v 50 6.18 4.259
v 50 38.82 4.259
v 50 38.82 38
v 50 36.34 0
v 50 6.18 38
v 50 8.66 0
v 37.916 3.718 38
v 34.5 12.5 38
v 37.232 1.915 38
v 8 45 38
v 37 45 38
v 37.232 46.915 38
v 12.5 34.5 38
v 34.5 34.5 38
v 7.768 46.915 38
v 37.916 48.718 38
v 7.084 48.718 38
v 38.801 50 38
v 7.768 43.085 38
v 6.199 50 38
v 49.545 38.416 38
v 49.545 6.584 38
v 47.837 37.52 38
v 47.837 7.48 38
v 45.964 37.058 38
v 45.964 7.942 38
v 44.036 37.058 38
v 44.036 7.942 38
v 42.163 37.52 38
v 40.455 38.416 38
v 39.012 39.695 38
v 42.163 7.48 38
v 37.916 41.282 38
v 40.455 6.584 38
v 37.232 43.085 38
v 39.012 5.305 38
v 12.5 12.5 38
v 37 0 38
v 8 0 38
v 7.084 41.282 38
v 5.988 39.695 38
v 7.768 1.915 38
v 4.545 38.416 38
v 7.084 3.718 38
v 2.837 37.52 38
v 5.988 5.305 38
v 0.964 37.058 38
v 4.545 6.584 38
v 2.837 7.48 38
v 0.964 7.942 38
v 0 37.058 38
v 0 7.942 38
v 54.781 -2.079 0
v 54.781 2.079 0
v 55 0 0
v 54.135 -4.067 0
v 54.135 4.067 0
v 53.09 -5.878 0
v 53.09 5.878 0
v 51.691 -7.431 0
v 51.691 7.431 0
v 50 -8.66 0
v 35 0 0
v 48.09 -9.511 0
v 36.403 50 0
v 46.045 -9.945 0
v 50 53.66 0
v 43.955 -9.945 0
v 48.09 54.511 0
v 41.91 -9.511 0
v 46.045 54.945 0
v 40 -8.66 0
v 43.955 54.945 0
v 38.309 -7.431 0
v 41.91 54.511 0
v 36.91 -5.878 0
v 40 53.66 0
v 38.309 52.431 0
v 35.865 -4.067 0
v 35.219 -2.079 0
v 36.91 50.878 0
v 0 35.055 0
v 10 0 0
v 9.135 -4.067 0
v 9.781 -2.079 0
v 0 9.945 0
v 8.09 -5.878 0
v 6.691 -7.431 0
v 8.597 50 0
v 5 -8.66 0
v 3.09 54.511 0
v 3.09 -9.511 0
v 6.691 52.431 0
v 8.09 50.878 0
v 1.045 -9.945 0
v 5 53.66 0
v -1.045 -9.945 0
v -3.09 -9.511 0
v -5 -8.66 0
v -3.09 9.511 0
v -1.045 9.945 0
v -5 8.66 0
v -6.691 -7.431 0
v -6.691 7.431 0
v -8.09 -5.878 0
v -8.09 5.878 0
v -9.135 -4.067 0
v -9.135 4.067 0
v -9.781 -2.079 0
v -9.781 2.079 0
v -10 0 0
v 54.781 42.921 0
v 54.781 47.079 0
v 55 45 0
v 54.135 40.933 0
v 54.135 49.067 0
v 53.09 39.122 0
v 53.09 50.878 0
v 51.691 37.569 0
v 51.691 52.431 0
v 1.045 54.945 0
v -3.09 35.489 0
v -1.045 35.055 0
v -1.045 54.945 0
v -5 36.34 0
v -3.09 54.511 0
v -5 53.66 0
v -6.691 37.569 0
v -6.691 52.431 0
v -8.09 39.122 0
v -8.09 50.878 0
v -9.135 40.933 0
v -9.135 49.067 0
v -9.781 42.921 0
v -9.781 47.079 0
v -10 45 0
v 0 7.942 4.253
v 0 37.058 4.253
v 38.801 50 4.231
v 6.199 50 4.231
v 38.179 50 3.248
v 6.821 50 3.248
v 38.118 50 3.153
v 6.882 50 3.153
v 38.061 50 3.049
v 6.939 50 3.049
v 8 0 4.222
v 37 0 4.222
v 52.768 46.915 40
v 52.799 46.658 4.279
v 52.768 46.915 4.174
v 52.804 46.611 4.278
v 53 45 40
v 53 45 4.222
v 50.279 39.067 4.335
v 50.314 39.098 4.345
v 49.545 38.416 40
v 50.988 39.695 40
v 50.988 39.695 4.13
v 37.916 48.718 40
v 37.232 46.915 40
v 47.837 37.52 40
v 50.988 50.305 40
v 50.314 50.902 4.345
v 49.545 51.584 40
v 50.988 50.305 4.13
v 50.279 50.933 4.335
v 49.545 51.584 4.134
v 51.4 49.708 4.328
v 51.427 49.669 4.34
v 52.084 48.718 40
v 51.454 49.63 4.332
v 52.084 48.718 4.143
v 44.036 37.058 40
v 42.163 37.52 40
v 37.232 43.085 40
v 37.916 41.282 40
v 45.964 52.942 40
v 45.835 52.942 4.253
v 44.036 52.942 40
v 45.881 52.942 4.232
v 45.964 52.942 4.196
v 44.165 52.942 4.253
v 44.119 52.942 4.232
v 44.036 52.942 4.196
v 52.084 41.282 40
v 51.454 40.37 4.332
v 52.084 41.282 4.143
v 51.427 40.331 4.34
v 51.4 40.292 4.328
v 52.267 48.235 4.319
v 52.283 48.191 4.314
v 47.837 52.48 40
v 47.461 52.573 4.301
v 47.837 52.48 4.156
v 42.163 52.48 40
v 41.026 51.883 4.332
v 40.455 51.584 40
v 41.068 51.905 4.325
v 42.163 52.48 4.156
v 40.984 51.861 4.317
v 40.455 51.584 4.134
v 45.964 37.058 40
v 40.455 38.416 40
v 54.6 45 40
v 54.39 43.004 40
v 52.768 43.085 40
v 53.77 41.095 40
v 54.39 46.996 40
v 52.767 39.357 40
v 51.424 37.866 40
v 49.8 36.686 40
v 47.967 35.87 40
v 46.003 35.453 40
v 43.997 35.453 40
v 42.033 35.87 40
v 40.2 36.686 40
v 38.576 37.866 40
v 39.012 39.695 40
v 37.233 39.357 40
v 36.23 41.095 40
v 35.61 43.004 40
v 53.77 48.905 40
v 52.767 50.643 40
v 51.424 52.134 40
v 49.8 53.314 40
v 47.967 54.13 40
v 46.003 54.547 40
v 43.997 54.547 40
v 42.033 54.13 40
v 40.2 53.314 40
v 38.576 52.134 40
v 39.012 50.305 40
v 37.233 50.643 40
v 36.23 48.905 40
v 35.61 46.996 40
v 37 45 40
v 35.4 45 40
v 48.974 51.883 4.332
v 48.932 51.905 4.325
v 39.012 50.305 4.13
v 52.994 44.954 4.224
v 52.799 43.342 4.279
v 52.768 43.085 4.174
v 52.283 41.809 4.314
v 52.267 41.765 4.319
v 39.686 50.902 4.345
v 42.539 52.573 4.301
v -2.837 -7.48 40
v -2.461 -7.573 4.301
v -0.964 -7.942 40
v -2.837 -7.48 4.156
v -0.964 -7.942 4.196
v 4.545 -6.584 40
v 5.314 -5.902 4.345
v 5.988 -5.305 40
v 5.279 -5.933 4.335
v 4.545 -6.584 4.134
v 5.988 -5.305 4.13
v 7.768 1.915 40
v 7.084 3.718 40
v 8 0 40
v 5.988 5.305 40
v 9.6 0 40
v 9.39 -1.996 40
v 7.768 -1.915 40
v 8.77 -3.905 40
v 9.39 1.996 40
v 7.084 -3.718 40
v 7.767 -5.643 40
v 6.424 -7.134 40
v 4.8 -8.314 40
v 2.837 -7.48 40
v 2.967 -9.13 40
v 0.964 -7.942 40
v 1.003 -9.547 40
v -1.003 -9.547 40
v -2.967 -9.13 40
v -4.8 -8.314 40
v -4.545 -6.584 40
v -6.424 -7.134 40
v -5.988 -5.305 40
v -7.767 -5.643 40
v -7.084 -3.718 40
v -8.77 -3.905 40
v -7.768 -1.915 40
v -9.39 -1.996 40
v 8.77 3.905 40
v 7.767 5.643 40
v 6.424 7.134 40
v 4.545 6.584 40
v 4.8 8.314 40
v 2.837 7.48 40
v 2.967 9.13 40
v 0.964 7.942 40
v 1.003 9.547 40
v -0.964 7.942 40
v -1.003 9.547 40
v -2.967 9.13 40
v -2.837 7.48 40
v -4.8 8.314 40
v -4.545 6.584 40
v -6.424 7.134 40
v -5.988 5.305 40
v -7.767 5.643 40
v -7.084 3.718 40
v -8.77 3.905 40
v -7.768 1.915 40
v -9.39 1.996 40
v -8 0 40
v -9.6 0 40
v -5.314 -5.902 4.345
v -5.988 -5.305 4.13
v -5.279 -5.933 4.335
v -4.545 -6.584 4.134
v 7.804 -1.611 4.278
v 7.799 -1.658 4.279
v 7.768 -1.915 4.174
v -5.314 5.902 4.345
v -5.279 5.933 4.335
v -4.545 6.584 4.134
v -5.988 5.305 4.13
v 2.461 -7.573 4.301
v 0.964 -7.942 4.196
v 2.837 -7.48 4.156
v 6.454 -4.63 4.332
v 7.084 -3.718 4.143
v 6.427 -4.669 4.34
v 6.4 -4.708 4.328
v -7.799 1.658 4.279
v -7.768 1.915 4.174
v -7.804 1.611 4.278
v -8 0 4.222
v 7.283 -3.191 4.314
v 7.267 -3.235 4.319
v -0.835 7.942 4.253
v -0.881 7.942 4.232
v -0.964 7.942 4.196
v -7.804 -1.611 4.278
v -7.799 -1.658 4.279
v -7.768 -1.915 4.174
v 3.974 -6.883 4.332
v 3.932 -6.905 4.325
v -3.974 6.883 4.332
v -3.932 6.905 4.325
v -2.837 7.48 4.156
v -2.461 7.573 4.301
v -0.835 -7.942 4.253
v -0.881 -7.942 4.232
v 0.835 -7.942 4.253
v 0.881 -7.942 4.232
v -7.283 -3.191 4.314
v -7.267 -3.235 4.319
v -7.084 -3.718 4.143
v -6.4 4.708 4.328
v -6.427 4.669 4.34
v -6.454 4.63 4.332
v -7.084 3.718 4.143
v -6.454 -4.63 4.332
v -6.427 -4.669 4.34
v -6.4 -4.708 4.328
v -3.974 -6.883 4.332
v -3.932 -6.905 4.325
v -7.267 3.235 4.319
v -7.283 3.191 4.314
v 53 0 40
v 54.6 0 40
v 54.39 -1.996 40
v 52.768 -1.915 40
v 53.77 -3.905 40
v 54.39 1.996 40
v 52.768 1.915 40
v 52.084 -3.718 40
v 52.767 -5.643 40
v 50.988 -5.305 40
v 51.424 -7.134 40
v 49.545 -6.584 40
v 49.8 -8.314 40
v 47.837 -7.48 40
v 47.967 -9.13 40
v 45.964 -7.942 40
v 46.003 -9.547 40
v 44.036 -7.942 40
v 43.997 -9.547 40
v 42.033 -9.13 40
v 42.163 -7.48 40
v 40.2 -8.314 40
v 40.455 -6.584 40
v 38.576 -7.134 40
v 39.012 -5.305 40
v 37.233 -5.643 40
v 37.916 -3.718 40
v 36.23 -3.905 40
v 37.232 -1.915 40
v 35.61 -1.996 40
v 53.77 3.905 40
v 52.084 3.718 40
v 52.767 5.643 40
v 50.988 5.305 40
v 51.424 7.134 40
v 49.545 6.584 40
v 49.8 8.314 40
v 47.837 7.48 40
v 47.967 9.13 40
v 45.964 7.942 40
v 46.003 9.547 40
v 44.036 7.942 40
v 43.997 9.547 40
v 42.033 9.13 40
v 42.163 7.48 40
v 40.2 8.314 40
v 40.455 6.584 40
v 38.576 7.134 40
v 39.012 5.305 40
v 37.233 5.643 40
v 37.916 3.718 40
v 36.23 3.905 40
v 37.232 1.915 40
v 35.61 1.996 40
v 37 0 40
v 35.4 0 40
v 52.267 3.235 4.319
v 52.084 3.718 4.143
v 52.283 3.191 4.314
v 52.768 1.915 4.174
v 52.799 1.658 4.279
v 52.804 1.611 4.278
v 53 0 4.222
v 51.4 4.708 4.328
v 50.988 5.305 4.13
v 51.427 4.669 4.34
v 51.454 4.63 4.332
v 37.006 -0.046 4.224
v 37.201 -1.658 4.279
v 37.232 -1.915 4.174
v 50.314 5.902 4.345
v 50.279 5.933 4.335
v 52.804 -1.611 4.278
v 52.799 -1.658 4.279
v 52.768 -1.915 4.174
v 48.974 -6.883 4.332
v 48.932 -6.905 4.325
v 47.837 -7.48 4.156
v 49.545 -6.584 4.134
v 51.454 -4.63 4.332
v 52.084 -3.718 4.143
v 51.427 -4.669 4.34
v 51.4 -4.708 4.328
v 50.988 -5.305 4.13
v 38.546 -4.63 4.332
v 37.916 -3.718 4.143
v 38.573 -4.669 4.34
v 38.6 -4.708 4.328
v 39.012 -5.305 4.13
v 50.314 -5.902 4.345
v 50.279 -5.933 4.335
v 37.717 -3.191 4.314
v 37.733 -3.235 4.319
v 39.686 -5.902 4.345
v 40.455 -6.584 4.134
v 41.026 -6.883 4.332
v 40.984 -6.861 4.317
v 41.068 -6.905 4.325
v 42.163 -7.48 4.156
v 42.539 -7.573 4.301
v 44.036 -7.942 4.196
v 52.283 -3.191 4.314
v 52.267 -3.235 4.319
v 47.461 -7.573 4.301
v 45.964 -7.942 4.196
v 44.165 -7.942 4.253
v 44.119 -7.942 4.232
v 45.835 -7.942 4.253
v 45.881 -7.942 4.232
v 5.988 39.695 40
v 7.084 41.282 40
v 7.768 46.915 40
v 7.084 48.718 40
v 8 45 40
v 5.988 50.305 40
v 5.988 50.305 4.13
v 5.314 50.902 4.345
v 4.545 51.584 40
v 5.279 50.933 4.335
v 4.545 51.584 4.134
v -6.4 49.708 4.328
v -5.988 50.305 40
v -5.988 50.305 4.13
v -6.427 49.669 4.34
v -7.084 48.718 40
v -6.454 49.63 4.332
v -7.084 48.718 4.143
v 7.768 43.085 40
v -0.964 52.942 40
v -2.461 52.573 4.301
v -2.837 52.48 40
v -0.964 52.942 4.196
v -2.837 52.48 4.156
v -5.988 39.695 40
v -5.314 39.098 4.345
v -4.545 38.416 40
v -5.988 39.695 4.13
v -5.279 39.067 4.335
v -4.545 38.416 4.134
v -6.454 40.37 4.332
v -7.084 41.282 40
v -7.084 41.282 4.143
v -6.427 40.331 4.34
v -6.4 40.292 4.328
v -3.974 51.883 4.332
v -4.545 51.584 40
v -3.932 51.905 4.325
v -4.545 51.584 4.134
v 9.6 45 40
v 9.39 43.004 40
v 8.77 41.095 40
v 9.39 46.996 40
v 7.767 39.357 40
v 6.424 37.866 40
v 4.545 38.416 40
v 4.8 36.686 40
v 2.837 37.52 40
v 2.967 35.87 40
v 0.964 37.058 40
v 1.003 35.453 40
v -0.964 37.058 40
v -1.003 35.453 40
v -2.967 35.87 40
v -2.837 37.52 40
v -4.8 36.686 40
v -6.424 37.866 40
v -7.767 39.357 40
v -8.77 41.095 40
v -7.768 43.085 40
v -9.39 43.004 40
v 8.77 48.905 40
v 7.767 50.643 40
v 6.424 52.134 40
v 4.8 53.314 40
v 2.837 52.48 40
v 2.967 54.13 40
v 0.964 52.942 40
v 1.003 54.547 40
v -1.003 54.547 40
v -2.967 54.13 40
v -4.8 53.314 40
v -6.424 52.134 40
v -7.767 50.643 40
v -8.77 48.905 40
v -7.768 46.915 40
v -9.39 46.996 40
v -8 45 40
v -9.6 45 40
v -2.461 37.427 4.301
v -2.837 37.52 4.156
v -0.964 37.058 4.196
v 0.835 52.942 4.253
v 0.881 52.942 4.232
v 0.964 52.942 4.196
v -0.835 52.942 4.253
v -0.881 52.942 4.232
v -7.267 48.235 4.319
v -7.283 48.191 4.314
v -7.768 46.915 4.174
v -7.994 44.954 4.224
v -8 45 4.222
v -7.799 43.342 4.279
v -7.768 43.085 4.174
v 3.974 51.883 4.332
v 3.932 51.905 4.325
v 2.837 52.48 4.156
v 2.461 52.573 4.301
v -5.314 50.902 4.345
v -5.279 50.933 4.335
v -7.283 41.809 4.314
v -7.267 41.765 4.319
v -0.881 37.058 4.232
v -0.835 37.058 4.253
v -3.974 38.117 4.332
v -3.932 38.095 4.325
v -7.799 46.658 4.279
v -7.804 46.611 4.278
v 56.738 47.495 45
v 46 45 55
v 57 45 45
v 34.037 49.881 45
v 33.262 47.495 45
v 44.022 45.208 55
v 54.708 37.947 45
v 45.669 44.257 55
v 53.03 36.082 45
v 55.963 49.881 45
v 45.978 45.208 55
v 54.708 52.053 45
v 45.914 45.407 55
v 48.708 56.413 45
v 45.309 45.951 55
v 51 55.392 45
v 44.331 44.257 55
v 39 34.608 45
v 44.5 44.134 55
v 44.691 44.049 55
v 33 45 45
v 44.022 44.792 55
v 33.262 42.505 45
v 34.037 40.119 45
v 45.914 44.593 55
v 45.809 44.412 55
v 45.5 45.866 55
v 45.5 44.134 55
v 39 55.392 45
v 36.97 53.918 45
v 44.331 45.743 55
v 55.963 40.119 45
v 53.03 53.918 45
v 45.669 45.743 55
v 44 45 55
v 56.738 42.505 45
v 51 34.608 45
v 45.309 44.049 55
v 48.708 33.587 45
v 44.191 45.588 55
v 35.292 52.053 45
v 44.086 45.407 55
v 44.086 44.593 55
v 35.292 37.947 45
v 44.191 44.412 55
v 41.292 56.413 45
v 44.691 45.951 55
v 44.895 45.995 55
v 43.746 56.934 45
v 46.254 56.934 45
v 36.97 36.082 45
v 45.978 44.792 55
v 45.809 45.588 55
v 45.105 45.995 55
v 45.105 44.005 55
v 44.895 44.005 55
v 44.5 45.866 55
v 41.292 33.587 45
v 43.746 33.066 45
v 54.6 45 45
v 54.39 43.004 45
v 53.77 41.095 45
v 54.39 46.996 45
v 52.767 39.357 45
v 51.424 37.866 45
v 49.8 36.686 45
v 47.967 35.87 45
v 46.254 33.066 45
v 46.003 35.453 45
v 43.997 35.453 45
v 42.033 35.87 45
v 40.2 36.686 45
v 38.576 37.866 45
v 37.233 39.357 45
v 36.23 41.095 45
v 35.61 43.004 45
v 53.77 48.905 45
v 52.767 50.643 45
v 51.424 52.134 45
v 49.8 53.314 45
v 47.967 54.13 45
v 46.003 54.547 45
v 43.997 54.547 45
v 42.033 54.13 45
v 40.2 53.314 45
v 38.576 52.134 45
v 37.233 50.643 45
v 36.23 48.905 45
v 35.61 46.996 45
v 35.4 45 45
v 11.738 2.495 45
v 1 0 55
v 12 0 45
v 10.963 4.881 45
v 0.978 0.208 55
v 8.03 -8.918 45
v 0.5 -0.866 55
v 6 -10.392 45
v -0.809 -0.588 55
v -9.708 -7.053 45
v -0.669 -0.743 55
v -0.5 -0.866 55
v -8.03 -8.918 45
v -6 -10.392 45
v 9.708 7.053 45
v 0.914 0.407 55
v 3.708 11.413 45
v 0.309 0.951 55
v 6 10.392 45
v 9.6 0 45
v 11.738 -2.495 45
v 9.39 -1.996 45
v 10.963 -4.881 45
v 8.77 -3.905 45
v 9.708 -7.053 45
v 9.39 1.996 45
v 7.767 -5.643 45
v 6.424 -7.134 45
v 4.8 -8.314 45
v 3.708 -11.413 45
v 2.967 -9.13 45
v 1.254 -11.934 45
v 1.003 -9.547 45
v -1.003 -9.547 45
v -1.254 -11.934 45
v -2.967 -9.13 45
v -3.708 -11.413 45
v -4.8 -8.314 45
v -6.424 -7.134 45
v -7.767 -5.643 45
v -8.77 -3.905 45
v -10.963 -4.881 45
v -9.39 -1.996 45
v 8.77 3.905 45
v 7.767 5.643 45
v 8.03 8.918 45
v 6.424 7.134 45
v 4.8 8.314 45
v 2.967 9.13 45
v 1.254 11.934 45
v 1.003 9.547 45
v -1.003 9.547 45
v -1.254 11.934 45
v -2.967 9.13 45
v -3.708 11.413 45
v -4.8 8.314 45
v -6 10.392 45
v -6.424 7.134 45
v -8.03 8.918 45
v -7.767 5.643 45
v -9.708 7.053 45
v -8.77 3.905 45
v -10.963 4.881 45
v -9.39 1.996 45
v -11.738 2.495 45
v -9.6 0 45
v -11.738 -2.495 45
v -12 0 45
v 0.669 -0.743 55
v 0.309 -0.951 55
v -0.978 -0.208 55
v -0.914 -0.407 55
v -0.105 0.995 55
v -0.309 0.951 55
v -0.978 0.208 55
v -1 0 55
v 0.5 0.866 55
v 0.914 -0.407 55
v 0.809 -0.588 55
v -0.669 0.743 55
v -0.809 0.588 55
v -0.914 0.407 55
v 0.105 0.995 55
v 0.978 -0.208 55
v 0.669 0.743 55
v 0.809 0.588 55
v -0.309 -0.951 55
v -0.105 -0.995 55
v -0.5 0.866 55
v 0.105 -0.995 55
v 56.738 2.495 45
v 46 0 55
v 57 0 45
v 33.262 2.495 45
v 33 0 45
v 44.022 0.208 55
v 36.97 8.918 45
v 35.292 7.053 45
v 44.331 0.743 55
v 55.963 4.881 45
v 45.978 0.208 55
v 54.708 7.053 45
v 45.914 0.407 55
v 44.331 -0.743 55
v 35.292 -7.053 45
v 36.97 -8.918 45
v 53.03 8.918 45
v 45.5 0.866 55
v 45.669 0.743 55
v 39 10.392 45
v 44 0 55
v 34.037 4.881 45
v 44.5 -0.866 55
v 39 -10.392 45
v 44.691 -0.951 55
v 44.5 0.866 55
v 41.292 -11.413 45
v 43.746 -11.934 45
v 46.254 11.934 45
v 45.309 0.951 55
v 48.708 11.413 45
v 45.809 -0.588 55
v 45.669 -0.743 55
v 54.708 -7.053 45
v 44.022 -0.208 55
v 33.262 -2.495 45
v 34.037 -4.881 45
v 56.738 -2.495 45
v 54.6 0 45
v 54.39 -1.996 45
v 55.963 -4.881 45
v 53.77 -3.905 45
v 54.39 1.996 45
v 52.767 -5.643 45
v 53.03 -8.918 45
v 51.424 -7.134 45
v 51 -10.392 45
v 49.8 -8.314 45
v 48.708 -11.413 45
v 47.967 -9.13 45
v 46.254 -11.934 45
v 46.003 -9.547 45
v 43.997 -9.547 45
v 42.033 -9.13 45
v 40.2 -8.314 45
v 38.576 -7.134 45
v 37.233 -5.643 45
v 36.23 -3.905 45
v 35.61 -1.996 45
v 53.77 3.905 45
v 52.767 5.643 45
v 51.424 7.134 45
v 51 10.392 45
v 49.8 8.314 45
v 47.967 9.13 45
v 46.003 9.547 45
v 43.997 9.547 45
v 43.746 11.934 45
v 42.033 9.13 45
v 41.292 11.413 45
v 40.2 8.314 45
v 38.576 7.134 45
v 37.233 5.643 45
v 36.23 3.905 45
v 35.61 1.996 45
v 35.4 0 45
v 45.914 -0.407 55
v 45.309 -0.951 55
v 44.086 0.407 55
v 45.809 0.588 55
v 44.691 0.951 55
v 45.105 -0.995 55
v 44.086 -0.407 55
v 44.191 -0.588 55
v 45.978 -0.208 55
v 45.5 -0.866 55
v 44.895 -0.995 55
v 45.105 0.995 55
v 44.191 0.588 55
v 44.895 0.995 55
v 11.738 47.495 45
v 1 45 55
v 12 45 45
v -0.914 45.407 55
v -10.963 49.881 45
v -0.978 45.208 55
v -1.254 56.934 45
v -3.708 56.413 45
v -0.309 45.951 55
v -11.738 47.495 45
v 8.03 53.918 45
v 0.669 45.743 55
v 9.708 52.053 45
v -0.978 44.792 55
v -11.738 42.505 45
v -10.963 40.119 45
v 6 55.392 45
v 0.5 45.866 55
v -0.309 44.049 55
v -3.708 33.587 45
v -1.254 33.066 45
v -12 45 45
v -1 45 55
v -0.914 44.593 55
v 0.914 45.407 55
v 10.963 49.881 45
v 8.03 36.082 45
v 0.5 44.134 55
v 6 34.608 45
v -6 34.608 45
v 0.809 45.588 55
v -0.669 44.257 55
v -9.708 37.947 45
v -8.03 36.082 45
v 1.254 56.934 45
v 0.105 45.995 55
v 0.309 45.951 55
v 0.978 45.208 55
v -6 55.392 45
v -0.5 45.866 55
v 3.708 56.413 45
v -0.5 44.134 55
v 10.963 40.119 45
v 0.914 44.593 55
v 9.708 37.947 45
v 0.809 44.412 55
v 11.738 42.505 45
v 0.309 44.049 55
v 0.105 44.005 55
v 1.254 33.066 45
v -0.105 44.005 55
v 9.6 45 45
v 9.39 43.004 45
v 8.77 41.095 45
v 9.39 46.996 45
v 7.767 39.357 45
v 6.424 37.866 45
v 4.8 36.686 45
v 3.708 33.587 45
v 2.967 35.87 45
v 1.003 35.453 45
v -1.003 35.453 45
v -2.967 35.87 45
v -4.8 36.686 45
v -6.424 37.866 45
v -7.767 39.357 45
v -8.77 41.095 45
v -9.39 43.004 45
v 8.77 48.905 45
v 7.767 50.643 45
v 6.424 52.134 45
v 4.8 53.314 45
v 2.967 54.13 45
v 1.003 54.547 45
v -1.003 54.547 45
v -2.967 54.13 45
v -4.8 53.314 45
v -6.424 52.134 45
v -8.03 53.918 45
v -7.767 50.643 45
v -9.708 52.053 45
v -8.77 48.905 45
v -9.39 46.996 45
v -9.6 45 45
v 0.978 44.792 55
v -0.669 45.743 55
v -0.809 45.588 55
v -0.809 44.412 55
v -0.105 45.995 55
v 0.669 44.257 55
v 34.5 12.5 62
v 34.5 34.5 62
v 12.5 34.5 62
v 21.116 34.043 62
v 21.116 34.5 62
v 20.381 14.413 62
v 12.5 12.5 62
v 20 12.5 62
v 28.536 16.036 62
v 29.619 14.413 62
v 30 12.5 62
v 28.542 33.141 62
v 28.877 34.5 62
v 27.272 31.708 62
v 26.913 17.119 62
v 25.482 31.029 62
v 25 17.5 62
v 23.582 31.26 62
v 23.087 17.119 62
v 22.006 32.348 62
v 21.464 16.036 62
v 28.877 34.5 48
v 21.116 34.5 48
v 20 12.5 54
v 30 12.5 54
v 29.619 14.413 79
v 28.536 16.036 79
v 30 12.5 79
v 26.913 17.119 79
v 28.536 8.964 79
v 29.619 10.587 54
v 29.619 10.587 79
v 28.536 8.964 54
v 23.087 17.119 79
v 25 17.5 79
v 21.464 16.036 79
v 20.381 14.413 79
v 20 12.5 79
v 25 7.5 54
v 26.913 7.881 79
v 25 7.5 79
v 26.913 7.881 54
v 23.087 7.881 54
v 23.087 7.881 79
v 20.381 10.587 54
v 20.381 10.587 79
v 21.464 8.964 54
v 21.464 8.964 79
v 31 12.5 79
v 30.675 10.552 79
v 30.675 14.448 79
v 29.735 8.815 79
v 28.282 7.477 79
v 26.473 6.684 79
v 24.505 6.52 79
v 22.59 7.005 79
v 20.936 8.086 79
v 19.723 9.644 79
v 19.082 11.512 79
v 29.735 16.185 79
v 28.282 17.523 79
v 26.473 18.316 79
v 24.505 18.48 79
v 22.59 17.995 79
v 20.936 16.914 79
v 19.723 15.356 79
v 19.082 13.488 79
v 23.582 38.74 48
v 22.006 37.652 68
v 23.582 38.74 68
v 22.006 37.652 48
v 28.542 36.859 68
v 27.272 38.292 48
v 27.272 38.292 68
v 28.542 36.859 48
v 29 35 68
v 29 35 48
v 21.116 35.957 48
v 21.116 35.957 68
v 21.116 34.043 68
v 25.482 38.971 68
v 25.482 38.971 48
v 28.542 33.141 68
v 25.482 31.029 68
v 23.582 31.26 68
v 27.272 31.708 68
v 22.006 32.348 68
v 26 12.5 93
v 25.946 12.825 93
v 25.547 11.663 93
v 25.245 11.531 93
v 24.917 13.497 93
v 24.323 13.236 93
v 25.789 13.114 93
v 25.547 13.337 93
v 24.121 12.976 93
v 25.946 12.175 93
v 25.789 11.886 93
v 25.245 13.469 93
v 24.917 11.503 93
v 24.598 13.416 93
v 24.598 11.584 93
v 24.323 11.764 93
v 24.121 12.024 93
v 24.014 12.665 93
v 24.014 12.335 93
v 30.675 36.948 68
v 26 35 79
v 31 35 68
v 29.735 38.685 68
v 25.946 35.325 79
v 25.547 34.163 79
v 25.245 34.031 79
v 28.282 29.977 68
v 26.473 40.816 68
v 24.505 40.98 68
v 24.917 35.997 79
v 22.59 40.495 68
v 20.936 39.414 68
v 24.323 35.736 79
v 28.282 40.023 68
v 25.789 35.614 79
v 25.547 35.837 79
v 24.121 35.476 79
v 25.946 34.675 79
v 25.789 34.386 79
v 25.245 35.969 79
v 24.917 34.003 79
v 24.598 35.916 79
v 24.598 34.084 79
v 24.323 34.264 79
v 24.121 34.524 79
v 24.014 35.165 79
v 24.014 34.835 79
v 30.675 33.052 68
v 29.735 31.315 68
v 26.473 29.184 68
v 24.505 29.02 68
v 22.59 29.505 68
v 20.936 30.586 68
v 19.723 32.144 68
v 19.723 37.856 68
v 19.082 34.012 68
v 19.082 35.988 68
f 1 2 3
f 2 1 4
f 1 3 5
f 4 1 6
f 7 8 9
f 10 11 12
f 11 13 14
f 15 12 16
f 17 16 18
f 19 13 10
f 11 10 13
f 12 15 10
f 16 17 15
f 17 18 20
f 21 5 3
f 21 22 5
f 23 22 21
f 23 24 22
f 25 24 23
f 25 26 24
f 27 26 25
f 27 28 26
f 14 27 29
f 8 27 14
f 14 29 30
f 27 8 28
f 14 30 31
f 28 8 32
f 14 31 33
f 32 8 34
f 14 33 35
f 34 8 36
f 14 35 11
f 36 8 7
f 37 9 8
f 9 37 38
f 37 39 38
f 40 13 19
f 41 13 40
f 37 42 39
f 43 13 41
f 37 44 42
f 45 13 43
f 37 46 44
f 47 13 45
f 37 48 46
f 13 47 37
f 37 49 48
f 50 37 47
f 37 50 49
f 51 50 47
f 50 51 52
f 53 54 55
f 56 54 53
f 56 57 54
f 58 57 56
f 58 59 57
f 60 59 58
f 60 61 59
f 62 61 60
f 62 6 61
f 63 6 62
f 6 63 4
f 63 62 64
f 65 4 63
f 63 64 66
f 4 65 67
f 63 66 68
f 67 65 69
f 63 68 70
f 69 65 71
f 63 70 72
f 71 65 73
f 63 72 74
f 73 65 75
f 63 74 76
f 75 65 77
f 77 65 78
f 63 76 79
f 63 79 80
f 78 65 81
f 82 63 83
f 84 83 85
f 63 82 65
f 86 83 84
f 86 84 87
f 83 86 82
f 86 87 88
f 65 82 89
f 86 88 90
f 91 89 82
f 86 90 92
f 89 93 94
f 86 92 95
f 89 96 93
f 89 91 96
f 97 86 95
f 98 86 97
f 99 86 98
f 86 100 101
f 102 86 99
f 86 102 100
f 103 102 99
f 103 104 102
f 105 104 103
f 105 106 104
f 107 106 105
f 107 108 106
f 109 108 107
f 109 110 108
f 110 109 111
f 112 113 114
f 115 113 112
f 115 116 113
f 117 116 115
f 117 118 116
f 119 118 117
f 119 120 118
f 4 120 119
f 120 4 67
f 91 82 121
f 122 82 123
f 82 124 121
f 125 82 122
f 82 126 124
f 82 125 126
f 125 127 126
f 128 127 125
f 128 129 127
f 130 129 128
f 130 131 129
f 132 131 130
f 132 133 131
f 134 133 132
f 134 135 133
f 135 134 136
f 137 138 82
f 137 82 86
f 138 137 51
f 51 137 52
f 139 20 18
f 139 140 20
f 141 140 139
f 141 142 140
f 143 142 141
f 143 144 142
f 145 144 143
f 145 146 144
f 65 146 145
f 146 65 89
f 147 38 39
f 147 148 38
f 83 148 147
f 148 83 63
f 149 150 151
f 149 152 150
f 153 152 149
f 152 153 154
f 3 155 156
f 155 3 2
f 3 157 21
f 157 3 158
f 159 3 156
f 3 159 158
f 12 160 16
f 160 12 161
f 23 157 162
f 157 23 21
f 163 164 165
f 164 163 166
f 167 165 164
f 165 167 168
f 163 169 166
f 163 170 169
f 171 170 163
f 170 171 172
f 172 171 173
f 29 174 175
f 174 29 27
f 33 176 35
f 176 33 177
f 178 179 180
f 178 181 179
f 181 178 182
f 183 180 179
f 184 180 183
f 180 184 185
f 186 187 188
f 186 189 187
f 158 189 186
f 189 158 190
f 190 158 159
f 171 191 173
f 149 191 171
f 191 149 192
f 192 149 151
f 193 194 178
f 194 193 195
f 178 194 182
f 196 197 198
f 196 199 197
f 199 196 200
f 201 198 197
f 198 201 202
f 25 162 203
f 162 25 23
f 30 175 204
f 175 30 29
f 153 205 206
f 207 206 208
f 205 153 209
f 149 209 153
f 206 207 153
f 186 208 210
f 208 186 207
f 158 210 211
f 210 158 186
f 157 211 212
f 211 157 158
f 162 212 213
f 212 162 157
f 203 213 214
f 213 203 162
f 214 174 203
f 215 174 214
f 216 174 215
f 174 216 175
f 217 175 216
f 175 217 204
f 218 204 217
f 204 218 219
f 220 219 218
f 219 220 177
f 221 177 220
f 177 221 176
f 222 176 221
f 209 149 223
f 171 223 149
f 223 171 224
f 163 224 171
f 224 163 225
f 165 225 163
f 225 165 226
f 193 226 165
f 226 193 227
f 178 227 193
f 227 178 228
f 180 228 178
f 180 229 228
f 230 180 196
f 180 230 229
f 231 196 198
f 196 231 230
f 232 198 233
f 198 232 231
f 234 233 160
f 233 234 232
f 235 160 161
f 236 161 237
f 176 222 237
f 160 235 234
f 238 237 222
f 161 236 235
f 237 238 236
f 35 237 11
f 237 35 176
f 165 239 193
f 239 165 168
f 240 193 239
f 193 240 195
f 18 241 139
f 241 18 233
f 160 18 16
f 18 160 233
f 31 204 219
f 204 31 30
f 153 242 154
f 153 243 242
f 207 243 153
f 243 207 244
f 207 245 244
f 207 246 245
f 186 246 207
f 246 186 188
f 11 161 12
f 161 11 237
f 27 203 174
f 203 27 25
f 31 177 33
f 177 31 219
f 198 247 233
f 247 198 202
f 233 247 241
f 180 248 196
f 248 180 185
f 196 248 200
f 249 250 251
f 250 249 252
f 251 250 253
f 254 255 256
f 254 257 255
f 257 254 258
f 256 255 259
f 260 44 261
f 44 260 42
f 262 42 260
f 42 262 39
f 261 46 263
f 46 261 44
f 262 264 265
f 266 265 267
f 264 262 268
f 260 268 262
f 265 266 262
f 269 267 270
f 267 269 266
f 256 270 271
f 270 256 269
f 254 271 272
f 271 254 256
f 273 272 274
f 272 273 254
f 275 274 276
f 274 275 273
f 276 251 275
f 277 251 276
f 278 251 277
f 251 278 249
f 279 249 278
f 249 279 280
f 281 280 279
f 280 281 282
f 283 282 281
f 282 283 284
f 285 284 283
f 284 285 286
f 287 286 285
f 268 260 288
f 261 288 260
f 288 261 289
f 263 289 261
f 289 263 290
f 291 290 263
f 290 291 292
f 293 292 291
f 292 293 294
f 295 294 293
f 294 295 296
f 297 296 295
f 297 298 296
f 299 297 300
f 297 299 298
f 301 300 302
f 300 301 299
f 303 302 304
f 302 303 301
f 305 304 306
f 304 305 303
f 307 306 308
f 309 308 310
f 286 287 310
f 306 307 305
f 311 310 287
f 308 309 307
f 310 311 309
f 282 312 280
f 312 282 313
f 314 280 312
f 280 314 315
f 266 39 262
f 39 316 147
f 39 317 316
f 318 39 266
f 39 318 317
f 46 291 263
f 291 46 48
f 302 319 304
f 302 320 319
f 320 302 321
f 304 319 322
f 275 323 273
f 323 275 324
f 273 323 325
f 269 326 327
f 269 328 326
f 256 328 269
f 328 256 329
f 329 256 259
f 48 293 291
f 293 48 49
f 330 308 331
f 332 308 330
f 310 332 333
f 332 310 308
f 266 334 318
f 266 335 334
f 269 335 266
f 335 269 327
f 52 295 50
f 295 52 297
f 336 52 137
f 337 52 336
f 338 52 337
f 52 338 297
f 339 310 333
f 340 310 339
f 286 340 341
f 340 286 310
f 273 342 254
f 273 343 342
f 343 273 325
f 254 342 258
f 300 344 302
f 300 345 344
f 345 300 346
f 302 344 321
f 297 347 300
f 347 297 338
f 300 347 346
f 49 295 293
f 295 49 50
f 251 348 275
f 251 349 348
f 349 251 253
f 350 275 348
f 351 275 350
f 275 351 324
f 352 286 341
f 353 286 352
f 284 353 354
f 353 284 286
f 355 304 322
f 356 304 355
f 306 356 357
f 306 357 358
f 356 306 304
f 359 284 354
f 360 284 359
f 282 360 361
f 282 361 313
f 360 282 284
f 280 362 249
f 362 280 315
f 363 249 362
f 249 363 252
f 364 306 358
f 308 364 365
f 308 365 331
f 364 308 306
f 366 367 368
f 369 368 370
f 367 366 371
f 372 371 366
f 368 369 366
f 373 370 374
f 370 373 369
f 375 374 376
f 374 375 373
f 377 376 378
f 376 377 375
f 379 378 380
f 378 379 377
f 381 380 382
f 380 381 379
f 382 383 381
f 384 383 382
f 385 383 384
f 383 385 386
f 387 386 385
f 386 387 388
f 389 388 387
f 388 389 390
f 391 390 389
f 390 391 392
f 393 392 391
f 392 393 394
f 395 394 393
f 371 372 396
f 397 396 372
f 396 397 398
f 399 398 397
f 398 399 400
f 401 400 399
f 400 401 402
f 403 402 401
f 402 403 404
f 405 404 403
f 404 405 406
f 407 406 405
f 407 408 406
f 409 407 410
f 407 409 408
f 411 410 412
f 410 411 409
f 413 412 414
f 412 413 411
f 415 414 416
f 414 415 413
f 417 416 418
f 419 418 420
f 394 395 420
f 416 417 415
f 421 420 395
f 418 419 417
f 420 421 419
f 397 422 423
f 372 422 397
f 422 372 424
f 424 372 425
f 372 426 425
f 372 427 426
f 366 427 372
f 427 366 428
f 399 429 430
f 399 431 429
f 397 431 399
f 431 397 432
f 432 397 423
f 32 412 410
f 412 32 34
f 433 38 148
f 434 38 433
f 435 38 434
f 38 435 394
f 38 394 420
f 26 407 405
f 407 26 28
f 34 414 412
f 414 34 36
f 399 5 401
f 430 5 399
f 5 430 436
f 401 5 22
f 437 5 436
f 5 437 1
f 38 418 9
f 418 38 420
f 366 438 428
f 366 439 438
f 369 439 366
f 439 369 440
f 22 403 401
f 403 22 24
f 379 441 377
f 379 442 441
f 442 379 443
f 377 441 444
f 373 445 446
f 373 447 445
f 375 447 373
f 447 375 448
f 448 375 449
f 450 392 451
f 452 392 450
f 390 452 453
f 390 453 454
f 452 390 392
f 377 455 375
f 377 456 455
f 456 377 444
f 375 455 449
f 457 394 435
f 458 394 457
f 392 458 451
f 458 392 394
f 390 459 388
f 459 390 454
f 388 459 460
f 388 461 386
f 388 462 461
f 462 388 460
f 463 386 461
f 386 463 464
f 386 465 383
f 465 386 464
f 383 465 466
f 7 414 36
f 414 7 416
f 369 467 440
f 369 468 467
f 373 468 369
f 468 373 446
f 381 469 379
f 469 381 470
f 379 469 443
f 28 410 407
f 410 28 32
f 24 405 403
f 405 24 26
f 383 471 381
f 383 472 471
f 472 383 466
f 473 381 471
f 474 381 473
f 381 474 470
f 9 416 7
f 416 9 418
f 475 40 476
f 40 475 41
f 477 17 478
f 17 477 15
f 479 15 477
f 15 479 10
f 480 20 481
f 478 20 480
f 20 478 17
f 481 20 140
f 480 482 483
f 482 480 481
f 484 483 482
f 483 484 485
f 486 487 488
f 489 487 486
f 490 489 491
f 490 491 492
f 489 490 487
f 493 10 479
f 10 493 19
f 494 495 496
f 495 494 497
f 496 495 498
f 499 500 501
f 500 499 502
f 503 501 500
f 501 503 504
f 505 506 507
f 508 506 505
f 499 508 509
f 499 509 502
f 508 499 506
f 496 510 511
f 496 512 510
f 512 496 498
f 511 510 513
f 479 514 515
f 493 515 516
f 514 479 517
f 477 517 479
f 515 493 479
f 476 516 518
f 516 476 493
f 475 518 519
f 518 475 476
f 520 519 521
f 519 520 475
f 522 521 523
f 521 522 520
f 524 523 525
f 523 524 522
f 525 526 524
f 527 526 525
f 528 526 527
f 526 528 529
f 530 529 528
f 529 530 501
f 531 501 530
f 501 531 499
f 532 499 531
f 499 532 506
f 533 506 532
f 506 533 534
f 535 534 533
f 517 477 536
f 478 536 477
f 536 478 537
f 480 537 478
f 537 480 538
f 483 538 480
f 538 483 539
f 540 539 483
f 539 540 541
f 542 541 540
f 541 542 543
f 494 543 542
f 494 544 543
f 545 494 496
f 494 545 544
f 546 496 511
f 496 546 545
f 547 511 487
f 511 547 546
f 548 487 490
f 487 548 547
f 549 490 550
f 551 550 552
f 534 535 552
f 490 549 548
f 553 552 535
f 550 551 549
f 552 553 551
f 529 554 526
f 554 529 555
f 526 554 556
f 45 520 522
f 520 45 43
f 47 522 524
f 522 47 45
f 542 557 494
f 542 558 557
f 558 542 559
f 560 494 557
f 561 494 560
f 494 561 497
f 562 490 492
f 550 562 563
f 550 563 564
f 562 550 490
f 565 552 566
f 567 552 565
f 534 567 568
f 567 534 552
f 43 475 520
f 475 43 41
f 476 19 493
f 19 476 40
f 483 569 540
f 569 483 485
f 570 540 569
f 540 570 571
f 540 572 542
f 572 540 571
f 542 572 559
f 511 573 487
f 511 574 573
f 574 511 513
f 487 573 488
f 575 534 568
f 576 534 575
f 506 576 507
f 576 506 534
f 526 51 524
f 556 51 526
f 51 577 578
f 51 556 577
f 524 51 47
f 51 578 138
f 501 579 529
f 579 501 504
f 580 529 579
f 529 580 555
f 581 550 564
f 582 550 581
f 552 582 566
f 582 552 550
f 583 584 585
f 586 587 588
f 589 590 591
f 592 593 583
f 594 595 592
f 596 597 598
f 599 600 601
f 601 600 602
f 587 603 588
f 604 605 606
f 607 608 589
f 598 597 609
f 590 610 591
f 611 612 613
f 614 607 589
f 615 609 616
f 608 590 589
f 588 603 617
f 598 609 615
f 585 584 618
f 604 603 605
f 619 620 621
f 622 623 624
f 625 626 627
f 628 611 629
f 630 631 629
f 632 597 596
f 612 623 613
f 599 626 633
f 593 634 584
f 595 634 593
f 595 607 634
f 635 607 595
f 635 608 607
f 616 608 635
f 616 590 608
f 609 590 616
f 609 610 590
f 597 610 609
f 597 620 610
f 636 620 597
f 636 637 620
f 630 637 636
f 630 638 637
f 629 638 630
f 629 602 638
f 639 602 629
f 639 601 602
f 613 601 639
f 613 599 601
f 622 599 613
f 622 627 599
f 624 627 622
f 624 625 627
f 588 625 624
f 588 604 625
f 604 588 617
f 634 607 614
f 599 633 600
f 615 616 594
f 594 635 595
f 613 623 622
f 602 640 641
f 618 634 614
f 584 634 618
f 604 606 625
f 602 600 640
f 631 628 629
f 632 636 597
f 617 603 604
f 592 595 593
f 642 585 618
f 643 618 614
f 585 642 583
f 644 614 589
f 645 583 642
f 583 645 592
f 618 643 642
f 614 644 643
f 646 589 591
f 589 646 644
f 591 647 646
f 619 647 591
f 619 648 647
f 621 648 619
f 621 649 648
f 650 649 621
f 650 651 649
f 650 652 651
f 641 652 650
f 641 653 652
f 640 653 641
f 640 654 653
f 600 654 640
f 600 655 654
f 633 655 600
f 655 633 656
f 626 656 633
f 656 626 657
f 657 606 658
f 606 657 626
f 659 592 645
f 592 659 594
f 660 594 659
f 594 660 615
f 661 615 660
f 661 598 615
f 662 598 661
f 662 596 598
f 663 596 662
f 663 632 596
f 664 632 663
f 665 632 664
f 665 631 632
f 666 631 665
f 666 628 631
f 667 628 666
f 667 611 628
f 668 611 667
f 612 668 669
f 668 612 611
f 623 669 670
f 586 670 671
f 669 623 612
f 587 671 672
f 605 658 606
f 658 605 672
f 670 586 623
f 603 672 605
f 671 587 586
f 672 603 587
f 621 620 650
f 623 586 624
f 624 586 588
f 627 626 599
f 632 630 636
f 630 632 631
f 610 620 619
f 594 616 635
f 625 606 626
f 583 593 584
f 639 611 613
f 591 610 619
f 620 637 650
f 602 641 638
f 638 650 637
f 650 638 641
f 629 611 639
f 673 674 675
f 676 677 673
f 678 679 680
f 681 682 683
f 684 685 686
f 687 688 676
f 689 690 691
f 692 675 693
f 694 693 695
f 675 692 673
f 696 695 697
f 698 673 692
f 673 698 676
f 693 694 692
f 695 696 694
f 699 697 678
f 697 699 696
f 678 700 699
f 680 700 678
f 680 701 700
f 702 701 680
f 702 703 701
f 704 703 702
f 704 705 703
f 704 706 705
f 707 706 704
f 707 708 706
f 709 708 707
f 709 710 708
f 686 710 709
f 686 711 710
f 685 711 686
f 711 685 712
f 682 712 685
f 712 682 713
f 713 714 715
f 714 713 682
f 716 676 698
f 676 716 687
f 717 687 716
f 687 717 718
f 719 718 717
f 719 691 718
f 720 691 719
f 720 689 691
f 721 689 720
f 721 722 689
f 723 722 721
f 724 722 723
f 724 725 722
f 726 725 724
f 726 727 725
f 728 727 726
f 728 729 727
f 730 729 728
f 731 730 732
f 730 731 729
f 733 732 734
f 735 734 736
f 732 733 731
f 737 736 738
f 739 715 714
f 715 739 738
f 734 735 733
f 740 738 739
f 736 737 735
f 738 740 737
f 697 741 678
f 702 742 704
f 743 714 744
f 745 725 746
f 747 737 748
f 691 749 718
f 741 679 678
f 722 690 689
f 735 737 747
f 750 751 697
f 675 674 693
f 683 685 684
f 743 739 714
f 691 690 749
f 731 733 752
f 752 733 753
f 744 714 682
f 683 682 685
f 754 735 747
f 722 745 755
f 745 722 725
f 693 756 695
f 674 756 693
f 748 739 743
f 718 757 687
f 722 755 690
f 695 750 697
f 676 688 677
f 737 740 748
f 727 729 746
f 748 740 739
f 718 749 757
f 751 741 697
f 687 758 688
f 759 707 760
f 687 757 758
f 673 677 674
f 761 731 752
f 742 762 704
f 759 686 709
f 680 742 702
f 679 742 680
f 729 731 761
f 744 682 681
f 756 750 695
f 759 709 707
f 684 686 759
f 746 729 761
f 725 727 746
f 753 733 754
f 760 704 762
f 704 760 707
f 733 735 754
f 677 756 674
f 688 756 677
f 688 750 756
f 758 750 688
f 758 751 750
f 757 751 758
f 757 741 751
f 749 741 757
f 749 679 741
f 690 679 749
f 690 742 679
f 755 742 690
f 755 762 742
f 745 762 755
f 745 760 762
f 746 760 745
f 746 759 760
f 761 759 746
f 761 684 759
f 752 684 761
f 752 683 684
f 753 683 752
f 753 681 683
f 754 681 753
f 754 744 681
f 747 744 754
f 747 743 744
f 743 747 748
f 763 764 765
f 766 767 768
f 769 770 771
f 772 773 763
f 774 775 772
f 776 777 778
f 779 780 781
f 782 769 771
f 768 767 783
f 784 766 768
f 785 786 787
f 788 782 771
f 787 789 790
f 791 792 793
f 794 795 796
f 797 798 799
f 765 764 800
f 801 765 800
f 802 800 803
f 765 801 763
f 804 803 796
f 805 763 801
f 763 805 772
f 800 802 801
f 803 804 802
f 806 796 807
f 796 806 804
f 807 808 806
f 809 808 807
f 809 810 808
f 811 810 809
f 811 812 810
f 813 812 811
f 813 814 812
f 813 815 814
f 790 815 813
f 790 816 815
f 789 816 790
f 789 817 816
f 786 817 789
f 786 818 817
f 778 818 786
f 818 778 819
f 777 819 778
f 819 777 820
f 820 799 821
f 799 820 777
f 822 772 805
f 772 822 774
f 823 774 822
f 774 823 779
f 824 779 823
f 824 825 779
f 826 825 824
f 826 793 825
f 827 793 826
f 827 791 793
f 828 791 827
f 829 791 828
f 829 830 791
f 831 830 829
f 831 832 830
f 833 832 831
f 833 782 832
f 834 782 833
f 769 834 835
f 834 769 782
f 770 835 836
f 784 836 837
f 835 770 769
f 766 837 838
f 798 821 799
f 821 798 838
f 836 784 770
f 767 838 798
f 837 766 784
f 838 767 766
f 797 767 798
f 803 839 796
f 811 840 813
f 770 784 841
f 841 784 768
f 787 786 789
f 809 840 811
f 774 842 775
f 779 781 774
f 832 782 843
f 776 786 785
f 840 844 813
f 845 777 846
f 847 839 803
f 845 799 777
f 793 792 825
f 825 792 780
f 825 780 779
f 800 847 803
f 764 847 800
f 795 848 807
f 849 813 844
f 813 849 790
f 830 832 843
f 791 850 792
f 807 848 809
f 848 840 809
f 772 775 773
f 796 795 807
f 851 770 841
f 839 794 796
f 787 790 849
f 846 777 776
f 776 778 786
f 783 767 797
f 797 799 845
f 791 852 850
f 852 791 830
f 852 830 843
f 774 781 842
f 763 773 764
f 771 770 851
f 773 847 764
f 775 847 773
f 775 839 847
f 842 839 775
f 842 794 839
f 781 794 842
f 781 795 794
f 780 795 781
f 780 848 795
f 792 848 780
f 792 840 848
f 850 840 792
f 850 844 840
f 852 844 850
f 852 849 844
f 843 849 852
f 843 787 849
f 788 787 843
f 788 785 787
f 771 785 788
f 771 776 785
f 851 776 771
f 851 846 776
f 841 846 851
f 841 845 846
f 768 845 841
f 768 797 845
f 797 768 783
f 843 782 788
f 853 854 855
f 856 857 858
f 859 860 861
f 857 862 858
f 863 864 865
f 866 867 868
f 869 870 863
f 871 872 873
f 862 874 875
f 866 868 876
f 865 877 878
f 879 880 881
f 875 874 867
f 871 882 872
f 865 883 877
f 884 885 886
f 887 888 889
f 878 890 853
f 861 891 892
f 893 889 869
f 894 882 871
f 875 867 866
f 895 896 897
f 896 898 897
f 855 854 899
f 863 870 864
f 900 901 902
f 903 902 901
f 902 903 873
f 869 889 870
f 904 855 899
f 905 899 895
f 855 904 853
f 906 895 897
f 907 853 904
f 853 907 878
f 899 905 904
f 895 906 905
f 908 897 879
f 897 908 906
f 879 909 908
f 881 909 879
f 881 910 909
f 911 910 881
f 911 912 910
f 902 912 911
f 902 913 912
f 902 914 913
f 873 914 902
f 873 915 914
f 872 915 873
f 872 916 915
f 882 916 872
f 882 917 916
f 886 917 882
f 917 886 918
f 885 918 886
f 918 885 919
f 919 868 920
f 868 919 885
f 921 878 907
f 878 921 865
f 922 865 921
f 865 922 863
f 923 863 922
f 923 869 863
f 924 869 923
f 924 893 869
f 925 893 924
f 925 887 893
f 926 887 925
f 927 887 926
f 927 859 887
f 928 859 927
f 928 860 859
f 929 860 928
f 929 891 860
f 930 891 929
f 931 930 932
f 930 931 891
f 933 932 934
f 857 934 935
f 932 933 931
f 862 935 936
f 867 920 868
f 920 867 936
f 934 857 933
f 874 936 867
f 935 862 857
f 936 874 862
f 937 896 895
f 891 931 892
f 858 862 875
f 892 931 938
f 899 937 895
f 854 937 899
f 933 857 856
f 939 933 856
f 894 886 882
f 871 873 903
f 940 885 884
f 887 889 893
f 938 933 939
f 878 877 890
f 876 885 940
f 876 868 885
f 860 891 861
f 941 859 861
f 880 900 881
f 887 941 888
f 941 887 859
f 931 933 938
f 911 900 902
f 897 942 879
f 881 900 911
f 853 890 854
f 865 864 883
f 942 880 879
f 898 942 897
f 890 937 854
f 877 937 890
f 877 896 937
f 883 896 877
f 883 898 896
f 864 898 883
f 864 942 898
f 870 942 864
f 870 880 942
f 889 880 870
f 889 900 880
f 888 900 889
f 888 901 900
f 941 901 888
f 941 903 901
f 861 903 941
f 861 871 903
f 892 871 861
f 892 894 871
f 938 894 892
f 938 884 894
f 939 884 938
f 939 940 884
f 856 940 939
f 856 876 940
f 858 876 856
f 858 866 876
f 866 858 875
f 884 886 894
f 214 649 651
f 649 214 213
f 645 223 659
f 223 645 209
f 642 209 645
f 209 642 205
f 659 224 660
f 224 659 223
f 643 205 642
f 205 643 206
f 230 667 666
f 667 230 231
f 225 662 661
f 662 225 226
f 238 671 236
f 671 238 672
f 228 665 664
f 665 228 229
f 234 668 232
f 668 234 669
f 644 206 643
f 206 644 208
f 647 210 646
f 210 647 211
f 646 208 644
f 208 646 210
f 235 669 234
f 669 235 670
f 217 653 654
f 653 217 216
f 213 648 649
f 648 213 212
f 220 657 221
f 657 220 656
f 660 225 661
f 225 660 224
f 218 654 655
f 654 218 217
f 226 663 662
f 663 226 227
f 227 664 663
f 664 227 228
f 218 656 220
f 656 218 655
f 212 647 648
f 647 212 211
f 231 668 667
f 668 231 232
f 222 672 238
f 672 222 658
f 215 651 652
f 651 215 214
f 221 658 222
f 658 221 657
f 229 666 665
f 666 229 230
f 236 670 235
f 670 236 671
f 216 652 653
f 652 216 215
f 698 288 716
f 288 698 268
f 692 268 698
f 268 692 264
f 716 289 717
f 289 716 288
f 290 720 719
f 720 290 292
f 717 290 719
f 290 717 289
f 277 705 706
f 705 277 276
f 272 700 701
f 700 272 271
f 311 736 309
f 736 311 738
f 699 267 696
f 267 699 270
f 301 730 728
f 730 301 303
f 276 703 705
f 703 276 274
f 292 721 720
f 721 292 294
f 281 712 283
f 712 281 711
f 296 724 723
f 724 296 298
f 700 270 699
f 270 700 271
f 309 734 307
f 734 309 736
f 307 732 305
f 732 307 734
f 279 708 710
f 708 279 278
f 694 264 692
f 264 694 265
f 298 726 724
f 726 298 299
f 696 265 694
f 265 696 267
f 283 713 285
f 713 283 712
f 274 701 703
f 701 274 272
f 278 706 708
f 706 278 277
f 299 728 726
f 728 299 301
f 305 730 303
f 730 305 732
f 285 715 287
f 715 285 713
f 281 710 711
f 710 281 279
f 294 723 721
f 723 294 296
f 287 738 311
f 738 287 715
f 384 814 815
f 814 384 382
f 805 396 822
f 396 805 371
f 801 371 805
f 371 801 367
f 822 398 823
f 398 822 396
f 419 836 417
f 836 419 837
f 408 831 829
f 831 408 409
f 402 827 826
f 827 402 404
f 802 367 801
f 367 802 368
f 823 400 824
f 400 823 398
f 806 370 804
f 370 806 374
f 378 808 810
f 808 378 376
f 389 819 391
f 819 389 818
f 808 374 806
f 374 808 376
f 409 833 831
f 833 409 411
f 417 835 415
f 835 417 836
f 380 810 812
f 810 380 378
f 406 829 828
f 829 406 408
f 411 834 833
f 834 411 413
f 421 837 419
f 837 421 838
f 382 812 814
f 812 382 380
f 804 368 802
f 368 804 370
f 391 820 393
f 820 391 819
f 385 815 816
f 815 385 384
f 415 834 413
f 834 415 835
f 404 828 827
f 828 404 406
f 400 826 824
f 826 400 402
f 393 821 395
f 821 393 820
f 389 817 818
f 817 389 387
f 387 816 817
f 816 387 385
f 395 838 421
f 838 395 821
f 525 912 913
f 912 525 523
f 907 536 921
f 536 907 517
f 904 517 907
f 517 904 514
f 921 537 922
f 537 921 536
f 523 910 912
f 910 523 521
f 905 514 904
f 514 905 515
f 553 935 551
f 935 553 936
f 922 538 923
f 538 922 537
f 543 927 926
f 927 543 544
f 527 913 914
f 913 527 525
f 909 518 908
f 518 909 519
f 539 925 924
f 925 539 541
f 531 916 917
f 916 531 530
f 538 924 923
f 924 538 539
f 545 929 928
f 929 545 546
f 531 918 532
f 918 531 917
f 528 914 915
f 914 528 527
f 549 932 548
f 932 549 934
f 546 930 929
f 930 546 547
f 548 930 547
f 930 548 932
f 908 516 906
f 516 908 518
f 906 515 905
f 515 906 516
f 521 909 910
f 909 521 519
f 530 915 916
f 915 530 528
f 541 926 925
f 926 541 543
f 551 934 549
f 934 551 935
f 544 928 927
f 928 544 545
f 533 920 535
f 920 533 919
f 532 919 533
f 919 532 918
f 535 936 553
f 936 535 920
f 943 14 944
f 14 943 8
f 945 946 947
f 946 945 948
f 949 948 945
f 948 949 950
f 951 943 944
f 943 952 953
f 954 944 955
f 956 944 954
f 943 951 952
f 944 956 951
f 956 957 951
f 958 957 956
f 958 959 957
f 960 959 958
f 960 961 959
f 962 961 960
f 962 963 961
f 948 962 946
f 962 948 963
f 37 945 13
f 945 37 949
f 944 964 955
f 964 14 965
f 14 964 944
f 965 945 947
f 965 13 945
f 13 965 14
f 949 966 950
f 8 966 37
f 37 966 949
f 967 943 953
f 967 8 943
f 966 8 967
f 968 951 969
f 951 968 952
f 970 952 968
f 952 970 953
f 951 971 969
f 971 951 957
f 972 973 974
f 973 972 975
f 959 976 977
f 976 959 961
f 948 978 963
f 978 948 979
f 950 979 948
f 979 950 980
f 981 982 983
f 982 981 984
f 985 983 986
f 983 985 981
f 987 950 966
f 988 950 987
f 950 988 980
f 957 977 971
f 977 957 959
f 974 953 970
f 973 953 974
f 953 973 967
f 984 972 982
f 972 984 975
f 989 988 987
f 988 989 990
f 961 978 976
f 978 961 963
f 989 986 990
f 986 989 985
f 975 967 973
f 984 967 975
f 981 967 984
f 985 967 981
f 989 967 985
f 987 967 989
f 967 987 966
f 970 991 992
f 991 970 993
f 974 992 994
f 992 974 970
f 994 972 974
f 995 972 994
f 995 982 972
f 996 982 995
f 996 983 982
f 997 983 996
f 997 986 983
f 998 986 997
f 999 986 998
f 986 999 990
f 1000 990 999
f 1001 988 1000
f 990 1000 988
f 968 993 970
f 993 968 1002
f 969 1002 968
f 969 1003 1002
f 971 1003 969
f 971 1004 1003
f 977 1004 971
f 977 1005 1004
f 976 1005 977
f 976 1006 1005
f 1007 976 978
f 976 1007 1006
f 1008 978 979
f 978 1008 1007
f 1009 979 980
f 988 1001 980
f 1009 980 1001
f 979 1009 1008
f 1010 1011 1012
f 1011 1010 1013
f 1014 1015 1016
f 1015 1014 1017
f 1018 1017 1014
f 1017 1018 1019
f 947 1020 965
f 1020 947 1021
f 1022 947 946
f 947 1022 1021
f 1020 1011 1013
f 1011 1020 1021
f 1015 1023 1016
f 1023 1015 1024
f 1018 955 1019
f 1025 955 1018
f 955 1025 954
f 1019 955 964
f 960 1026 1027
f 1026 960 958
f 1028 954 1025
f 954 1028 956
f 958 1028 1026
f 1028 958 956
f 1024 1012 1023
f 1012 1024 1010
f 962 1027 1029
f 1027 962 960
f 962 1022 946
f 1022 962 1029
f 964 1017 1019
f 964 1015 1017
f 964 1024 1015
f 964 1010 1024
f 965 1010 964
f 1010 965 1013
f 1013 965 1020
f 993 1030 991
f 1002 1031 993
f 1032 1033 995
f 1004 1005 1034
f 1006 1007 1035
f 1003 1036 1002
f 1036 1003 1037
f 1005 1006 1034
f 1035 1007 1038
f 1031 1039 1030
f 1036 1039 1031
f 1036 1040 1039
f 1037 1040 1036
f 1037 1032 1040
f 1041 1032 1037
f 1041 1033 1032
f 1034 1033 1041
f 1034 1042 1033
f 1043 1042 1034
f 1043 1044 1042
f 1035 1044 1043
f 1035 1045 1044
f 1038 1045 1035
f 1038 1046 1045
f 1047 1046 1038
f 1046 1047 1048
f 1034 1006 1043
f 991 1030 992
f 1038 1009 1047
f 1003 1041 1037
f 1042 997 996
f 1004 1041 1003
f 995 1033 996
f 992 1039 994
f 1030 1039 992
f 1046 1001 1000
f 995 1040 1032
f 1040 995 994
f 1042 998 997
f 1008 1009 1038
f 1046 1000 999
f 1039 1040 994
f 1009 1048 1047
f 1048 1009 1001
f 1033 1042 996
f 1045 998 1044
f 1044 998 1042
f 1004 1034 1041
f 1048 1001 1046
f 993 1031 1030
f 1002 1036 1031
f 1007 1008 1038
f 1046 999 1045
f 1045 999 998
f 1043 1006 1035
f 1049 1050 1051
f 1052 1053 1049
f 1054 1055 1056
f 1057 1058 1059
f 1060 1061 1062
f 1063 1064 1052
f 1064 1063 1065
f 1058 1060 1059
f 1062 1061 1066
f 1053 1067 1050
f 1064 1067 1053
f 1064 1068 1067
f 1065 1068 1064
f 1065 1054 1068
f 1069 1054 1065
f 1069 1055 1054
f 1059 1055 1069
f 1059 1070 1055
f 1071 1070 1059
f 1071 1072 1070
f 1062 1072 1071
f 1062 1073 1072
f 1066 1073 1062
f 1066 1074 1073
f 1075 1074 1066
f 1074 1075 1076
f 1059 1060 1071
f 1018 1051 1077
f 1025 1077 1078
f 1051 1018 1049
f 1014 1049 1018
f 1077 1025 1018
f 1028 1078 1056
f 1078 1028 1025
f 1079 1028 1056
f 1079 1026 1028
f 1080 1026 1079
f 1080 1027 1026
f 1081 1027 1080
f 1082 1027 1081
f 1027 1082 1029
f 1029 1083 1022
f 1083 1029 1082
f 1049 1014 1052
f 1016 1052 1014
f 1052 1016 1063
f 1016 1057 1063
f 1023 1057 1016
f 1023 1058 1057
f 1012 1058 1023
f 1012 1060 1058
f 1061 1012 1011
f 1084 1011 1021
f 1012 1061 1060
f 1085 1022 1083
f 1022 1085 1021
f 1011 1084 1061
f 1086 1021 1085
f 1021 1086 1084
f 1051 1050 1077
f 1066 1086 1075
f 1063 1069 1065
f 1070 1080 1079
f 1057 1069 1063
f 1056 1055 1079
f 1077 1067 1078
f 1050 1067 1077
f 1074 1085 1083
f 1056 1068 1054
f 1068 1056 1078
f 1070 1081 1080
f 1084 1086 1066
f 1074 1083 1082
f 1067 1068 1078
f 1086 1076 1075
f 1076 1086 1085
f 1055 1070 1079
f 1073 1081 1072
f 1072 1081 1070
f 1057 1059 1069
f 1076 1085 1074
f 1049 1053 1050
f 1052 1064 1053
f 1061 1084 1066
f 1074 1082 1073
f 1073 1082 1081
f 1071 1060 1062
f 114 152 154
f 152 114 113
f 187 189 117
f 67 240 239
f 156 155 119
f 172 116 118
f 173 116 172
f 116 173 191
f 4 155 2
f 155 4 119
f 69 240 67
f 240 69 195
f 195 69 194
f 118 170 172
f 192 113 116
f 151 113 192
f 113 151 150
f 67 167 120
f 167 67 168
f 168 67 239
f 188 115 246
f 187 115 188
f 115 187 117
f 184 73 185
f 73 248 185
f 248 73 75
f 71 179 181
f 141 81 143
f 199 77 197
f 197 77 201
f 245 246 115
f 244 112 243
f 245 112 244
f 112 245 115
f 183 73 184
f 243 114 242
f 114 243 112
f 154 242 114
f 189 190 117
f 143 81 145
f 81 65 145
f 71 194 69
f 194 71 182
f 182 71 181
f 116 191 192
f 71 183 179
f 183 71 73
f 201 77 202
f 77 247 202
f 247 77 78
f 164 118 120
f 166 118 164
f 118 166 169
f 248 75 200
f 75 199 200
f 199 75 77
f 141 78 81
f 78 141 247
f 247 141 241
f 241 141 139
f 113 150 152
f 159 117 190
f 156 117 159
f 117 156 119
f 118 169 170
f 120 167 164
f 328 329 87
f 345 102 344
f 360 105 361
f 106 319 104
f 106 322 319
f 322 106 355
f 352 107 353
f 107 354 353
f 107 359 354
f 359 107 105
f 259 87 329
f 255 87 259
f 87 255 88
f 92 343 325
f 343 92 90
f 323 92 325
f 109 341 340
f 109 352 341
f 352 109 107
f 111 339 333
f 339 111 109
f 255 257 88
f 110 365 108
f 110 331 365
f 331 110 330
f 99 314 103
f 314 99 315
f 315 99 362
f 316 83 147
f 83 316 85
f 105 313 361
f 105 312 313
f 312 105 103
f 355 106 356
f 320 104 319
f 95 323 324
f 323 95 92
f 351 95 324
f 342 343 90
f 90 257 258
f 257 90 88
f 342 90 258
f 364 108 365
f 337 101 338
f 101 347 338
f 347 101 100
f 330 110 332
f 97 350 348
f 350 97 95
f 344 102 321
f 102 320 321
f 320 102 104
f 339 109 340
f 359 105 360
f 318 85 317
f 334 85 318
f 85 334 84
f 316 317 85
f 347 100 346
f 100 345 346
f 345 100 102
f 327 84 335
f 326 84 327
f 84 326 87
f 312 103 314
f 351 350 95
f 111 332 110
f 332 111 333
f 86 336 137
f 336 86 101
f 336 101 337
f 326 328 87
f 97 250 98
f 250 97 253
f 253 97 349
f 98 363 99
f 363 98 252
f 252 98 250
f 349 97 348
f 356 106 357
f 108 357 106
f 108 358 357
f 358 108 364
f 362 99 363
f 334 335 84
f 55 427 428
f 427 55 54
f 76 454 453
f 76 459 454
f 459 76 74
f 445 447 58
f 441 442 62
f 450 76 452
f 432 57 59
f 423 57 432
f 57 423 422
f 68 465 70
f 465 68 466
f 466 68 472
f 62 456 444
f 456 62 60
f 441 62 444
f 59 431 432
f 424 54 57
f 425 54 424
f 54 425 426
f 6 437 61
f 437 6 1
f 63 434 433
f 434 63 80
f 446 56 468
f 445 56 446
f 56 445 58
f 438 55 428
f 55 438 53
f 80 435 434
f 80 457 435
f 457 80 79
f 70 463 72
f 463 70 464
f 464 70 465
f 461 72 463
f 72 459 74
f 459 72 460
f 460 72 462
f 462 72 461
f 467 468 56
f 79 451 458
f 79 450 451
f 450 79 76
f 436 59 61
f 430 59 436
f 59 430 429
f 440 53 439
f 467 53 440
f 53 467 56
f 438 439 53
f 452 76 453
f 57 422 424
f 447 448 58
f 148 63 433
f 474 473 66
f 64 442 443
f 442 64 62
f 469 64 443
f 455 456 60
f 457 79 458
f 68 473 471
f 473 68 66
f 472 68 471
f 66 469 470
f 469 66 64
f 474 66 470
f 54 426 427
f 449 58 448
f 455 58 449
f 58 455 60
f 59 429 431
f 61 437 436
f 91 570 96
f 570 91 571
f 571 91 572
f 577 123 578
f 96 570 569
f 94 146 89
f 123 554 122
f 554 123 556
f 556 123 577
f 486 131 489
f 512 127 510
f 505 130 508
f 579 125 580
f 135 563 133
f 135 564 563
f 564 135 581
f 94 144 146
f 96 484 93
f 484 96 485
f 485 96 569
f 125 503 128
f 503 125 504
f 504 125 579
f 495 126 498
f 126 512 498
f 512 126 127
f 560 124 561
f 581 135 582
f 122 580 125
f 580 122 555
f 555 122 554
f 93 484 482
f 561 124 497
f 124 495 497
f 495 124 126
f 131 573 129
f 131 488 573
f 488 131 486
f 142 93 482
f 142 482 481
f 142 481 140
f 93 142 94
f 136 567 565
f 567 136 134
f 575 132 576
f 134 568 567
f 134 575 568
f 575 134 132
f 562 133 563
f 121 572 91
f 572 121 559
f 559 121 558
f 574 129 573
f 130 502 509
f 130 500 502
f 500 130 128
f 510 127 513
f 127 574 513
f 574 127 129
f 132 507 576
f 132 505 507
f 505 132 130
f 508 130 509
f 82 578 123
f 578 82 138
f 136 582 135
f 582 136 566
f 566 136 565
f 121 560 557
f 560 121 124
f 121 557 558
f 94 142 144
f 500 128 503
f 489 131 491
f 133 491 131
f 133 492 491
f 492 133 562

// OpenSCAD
x = 8;   // diamentro cilindro
tc = 40; // tamanho cilindro
ac = 10; // altura cone maior
dc = 12; // diametro cone maior
y = 0;   // posicao 1
z = 45;  // posicao 2

// cubo maior
translate([0,0,0]) cube([50,50,38]);

// torres
translate([z,z,0]) cylinder(tc,x,x);
translate([y,y,0]) cylinder(tc,x,x);
translate([z,y,0]) cylinder(tc,x,x);
translate([y,z,0]) cylinder(tc,x,x);

// cone das torres
translate([z,z,tc+acab]) cylinder(ac,dc);
translate([y,y,tc+acab]) cylinder(ac,dc);
translate([z,y,tc+acab]) cylinder(ac,dc);
translate([y,z,tc+acab]) cylinder(ac,dc);

// cabine torres
acab = 5; // altura cabine
translate([z,z,tc]) cylinder(acab,9.6,9.6);
translate([y,y,tc]) cylinder(acab,9.6,9.6);
translate([z,y,tc]) cylinder(acab,9.6,9.6);
translate([y,z,tc]) cylinder(acab,9.6,9.6);

// cubo menor
translate ([12.5,12.5,38]) cube([22,22,24]);

// torres menores
translate([25,12.5,54]) cylinder(25,5,5);
translate([25,35,48]) cylinder(22,4,4);

// cone das torres menores
translate([25,12.5,79]) cylinder(14,6);
translate([25,35,68]) cylinder(11,6);

// pé das torres
translate([z,z,0]) cylinder(19,10);
translate([y,y,0]) cylinder(19,10);
translate([z,y,0]) cylinder(19,10);
translate([y,z,0]) cylinder(19,10);
